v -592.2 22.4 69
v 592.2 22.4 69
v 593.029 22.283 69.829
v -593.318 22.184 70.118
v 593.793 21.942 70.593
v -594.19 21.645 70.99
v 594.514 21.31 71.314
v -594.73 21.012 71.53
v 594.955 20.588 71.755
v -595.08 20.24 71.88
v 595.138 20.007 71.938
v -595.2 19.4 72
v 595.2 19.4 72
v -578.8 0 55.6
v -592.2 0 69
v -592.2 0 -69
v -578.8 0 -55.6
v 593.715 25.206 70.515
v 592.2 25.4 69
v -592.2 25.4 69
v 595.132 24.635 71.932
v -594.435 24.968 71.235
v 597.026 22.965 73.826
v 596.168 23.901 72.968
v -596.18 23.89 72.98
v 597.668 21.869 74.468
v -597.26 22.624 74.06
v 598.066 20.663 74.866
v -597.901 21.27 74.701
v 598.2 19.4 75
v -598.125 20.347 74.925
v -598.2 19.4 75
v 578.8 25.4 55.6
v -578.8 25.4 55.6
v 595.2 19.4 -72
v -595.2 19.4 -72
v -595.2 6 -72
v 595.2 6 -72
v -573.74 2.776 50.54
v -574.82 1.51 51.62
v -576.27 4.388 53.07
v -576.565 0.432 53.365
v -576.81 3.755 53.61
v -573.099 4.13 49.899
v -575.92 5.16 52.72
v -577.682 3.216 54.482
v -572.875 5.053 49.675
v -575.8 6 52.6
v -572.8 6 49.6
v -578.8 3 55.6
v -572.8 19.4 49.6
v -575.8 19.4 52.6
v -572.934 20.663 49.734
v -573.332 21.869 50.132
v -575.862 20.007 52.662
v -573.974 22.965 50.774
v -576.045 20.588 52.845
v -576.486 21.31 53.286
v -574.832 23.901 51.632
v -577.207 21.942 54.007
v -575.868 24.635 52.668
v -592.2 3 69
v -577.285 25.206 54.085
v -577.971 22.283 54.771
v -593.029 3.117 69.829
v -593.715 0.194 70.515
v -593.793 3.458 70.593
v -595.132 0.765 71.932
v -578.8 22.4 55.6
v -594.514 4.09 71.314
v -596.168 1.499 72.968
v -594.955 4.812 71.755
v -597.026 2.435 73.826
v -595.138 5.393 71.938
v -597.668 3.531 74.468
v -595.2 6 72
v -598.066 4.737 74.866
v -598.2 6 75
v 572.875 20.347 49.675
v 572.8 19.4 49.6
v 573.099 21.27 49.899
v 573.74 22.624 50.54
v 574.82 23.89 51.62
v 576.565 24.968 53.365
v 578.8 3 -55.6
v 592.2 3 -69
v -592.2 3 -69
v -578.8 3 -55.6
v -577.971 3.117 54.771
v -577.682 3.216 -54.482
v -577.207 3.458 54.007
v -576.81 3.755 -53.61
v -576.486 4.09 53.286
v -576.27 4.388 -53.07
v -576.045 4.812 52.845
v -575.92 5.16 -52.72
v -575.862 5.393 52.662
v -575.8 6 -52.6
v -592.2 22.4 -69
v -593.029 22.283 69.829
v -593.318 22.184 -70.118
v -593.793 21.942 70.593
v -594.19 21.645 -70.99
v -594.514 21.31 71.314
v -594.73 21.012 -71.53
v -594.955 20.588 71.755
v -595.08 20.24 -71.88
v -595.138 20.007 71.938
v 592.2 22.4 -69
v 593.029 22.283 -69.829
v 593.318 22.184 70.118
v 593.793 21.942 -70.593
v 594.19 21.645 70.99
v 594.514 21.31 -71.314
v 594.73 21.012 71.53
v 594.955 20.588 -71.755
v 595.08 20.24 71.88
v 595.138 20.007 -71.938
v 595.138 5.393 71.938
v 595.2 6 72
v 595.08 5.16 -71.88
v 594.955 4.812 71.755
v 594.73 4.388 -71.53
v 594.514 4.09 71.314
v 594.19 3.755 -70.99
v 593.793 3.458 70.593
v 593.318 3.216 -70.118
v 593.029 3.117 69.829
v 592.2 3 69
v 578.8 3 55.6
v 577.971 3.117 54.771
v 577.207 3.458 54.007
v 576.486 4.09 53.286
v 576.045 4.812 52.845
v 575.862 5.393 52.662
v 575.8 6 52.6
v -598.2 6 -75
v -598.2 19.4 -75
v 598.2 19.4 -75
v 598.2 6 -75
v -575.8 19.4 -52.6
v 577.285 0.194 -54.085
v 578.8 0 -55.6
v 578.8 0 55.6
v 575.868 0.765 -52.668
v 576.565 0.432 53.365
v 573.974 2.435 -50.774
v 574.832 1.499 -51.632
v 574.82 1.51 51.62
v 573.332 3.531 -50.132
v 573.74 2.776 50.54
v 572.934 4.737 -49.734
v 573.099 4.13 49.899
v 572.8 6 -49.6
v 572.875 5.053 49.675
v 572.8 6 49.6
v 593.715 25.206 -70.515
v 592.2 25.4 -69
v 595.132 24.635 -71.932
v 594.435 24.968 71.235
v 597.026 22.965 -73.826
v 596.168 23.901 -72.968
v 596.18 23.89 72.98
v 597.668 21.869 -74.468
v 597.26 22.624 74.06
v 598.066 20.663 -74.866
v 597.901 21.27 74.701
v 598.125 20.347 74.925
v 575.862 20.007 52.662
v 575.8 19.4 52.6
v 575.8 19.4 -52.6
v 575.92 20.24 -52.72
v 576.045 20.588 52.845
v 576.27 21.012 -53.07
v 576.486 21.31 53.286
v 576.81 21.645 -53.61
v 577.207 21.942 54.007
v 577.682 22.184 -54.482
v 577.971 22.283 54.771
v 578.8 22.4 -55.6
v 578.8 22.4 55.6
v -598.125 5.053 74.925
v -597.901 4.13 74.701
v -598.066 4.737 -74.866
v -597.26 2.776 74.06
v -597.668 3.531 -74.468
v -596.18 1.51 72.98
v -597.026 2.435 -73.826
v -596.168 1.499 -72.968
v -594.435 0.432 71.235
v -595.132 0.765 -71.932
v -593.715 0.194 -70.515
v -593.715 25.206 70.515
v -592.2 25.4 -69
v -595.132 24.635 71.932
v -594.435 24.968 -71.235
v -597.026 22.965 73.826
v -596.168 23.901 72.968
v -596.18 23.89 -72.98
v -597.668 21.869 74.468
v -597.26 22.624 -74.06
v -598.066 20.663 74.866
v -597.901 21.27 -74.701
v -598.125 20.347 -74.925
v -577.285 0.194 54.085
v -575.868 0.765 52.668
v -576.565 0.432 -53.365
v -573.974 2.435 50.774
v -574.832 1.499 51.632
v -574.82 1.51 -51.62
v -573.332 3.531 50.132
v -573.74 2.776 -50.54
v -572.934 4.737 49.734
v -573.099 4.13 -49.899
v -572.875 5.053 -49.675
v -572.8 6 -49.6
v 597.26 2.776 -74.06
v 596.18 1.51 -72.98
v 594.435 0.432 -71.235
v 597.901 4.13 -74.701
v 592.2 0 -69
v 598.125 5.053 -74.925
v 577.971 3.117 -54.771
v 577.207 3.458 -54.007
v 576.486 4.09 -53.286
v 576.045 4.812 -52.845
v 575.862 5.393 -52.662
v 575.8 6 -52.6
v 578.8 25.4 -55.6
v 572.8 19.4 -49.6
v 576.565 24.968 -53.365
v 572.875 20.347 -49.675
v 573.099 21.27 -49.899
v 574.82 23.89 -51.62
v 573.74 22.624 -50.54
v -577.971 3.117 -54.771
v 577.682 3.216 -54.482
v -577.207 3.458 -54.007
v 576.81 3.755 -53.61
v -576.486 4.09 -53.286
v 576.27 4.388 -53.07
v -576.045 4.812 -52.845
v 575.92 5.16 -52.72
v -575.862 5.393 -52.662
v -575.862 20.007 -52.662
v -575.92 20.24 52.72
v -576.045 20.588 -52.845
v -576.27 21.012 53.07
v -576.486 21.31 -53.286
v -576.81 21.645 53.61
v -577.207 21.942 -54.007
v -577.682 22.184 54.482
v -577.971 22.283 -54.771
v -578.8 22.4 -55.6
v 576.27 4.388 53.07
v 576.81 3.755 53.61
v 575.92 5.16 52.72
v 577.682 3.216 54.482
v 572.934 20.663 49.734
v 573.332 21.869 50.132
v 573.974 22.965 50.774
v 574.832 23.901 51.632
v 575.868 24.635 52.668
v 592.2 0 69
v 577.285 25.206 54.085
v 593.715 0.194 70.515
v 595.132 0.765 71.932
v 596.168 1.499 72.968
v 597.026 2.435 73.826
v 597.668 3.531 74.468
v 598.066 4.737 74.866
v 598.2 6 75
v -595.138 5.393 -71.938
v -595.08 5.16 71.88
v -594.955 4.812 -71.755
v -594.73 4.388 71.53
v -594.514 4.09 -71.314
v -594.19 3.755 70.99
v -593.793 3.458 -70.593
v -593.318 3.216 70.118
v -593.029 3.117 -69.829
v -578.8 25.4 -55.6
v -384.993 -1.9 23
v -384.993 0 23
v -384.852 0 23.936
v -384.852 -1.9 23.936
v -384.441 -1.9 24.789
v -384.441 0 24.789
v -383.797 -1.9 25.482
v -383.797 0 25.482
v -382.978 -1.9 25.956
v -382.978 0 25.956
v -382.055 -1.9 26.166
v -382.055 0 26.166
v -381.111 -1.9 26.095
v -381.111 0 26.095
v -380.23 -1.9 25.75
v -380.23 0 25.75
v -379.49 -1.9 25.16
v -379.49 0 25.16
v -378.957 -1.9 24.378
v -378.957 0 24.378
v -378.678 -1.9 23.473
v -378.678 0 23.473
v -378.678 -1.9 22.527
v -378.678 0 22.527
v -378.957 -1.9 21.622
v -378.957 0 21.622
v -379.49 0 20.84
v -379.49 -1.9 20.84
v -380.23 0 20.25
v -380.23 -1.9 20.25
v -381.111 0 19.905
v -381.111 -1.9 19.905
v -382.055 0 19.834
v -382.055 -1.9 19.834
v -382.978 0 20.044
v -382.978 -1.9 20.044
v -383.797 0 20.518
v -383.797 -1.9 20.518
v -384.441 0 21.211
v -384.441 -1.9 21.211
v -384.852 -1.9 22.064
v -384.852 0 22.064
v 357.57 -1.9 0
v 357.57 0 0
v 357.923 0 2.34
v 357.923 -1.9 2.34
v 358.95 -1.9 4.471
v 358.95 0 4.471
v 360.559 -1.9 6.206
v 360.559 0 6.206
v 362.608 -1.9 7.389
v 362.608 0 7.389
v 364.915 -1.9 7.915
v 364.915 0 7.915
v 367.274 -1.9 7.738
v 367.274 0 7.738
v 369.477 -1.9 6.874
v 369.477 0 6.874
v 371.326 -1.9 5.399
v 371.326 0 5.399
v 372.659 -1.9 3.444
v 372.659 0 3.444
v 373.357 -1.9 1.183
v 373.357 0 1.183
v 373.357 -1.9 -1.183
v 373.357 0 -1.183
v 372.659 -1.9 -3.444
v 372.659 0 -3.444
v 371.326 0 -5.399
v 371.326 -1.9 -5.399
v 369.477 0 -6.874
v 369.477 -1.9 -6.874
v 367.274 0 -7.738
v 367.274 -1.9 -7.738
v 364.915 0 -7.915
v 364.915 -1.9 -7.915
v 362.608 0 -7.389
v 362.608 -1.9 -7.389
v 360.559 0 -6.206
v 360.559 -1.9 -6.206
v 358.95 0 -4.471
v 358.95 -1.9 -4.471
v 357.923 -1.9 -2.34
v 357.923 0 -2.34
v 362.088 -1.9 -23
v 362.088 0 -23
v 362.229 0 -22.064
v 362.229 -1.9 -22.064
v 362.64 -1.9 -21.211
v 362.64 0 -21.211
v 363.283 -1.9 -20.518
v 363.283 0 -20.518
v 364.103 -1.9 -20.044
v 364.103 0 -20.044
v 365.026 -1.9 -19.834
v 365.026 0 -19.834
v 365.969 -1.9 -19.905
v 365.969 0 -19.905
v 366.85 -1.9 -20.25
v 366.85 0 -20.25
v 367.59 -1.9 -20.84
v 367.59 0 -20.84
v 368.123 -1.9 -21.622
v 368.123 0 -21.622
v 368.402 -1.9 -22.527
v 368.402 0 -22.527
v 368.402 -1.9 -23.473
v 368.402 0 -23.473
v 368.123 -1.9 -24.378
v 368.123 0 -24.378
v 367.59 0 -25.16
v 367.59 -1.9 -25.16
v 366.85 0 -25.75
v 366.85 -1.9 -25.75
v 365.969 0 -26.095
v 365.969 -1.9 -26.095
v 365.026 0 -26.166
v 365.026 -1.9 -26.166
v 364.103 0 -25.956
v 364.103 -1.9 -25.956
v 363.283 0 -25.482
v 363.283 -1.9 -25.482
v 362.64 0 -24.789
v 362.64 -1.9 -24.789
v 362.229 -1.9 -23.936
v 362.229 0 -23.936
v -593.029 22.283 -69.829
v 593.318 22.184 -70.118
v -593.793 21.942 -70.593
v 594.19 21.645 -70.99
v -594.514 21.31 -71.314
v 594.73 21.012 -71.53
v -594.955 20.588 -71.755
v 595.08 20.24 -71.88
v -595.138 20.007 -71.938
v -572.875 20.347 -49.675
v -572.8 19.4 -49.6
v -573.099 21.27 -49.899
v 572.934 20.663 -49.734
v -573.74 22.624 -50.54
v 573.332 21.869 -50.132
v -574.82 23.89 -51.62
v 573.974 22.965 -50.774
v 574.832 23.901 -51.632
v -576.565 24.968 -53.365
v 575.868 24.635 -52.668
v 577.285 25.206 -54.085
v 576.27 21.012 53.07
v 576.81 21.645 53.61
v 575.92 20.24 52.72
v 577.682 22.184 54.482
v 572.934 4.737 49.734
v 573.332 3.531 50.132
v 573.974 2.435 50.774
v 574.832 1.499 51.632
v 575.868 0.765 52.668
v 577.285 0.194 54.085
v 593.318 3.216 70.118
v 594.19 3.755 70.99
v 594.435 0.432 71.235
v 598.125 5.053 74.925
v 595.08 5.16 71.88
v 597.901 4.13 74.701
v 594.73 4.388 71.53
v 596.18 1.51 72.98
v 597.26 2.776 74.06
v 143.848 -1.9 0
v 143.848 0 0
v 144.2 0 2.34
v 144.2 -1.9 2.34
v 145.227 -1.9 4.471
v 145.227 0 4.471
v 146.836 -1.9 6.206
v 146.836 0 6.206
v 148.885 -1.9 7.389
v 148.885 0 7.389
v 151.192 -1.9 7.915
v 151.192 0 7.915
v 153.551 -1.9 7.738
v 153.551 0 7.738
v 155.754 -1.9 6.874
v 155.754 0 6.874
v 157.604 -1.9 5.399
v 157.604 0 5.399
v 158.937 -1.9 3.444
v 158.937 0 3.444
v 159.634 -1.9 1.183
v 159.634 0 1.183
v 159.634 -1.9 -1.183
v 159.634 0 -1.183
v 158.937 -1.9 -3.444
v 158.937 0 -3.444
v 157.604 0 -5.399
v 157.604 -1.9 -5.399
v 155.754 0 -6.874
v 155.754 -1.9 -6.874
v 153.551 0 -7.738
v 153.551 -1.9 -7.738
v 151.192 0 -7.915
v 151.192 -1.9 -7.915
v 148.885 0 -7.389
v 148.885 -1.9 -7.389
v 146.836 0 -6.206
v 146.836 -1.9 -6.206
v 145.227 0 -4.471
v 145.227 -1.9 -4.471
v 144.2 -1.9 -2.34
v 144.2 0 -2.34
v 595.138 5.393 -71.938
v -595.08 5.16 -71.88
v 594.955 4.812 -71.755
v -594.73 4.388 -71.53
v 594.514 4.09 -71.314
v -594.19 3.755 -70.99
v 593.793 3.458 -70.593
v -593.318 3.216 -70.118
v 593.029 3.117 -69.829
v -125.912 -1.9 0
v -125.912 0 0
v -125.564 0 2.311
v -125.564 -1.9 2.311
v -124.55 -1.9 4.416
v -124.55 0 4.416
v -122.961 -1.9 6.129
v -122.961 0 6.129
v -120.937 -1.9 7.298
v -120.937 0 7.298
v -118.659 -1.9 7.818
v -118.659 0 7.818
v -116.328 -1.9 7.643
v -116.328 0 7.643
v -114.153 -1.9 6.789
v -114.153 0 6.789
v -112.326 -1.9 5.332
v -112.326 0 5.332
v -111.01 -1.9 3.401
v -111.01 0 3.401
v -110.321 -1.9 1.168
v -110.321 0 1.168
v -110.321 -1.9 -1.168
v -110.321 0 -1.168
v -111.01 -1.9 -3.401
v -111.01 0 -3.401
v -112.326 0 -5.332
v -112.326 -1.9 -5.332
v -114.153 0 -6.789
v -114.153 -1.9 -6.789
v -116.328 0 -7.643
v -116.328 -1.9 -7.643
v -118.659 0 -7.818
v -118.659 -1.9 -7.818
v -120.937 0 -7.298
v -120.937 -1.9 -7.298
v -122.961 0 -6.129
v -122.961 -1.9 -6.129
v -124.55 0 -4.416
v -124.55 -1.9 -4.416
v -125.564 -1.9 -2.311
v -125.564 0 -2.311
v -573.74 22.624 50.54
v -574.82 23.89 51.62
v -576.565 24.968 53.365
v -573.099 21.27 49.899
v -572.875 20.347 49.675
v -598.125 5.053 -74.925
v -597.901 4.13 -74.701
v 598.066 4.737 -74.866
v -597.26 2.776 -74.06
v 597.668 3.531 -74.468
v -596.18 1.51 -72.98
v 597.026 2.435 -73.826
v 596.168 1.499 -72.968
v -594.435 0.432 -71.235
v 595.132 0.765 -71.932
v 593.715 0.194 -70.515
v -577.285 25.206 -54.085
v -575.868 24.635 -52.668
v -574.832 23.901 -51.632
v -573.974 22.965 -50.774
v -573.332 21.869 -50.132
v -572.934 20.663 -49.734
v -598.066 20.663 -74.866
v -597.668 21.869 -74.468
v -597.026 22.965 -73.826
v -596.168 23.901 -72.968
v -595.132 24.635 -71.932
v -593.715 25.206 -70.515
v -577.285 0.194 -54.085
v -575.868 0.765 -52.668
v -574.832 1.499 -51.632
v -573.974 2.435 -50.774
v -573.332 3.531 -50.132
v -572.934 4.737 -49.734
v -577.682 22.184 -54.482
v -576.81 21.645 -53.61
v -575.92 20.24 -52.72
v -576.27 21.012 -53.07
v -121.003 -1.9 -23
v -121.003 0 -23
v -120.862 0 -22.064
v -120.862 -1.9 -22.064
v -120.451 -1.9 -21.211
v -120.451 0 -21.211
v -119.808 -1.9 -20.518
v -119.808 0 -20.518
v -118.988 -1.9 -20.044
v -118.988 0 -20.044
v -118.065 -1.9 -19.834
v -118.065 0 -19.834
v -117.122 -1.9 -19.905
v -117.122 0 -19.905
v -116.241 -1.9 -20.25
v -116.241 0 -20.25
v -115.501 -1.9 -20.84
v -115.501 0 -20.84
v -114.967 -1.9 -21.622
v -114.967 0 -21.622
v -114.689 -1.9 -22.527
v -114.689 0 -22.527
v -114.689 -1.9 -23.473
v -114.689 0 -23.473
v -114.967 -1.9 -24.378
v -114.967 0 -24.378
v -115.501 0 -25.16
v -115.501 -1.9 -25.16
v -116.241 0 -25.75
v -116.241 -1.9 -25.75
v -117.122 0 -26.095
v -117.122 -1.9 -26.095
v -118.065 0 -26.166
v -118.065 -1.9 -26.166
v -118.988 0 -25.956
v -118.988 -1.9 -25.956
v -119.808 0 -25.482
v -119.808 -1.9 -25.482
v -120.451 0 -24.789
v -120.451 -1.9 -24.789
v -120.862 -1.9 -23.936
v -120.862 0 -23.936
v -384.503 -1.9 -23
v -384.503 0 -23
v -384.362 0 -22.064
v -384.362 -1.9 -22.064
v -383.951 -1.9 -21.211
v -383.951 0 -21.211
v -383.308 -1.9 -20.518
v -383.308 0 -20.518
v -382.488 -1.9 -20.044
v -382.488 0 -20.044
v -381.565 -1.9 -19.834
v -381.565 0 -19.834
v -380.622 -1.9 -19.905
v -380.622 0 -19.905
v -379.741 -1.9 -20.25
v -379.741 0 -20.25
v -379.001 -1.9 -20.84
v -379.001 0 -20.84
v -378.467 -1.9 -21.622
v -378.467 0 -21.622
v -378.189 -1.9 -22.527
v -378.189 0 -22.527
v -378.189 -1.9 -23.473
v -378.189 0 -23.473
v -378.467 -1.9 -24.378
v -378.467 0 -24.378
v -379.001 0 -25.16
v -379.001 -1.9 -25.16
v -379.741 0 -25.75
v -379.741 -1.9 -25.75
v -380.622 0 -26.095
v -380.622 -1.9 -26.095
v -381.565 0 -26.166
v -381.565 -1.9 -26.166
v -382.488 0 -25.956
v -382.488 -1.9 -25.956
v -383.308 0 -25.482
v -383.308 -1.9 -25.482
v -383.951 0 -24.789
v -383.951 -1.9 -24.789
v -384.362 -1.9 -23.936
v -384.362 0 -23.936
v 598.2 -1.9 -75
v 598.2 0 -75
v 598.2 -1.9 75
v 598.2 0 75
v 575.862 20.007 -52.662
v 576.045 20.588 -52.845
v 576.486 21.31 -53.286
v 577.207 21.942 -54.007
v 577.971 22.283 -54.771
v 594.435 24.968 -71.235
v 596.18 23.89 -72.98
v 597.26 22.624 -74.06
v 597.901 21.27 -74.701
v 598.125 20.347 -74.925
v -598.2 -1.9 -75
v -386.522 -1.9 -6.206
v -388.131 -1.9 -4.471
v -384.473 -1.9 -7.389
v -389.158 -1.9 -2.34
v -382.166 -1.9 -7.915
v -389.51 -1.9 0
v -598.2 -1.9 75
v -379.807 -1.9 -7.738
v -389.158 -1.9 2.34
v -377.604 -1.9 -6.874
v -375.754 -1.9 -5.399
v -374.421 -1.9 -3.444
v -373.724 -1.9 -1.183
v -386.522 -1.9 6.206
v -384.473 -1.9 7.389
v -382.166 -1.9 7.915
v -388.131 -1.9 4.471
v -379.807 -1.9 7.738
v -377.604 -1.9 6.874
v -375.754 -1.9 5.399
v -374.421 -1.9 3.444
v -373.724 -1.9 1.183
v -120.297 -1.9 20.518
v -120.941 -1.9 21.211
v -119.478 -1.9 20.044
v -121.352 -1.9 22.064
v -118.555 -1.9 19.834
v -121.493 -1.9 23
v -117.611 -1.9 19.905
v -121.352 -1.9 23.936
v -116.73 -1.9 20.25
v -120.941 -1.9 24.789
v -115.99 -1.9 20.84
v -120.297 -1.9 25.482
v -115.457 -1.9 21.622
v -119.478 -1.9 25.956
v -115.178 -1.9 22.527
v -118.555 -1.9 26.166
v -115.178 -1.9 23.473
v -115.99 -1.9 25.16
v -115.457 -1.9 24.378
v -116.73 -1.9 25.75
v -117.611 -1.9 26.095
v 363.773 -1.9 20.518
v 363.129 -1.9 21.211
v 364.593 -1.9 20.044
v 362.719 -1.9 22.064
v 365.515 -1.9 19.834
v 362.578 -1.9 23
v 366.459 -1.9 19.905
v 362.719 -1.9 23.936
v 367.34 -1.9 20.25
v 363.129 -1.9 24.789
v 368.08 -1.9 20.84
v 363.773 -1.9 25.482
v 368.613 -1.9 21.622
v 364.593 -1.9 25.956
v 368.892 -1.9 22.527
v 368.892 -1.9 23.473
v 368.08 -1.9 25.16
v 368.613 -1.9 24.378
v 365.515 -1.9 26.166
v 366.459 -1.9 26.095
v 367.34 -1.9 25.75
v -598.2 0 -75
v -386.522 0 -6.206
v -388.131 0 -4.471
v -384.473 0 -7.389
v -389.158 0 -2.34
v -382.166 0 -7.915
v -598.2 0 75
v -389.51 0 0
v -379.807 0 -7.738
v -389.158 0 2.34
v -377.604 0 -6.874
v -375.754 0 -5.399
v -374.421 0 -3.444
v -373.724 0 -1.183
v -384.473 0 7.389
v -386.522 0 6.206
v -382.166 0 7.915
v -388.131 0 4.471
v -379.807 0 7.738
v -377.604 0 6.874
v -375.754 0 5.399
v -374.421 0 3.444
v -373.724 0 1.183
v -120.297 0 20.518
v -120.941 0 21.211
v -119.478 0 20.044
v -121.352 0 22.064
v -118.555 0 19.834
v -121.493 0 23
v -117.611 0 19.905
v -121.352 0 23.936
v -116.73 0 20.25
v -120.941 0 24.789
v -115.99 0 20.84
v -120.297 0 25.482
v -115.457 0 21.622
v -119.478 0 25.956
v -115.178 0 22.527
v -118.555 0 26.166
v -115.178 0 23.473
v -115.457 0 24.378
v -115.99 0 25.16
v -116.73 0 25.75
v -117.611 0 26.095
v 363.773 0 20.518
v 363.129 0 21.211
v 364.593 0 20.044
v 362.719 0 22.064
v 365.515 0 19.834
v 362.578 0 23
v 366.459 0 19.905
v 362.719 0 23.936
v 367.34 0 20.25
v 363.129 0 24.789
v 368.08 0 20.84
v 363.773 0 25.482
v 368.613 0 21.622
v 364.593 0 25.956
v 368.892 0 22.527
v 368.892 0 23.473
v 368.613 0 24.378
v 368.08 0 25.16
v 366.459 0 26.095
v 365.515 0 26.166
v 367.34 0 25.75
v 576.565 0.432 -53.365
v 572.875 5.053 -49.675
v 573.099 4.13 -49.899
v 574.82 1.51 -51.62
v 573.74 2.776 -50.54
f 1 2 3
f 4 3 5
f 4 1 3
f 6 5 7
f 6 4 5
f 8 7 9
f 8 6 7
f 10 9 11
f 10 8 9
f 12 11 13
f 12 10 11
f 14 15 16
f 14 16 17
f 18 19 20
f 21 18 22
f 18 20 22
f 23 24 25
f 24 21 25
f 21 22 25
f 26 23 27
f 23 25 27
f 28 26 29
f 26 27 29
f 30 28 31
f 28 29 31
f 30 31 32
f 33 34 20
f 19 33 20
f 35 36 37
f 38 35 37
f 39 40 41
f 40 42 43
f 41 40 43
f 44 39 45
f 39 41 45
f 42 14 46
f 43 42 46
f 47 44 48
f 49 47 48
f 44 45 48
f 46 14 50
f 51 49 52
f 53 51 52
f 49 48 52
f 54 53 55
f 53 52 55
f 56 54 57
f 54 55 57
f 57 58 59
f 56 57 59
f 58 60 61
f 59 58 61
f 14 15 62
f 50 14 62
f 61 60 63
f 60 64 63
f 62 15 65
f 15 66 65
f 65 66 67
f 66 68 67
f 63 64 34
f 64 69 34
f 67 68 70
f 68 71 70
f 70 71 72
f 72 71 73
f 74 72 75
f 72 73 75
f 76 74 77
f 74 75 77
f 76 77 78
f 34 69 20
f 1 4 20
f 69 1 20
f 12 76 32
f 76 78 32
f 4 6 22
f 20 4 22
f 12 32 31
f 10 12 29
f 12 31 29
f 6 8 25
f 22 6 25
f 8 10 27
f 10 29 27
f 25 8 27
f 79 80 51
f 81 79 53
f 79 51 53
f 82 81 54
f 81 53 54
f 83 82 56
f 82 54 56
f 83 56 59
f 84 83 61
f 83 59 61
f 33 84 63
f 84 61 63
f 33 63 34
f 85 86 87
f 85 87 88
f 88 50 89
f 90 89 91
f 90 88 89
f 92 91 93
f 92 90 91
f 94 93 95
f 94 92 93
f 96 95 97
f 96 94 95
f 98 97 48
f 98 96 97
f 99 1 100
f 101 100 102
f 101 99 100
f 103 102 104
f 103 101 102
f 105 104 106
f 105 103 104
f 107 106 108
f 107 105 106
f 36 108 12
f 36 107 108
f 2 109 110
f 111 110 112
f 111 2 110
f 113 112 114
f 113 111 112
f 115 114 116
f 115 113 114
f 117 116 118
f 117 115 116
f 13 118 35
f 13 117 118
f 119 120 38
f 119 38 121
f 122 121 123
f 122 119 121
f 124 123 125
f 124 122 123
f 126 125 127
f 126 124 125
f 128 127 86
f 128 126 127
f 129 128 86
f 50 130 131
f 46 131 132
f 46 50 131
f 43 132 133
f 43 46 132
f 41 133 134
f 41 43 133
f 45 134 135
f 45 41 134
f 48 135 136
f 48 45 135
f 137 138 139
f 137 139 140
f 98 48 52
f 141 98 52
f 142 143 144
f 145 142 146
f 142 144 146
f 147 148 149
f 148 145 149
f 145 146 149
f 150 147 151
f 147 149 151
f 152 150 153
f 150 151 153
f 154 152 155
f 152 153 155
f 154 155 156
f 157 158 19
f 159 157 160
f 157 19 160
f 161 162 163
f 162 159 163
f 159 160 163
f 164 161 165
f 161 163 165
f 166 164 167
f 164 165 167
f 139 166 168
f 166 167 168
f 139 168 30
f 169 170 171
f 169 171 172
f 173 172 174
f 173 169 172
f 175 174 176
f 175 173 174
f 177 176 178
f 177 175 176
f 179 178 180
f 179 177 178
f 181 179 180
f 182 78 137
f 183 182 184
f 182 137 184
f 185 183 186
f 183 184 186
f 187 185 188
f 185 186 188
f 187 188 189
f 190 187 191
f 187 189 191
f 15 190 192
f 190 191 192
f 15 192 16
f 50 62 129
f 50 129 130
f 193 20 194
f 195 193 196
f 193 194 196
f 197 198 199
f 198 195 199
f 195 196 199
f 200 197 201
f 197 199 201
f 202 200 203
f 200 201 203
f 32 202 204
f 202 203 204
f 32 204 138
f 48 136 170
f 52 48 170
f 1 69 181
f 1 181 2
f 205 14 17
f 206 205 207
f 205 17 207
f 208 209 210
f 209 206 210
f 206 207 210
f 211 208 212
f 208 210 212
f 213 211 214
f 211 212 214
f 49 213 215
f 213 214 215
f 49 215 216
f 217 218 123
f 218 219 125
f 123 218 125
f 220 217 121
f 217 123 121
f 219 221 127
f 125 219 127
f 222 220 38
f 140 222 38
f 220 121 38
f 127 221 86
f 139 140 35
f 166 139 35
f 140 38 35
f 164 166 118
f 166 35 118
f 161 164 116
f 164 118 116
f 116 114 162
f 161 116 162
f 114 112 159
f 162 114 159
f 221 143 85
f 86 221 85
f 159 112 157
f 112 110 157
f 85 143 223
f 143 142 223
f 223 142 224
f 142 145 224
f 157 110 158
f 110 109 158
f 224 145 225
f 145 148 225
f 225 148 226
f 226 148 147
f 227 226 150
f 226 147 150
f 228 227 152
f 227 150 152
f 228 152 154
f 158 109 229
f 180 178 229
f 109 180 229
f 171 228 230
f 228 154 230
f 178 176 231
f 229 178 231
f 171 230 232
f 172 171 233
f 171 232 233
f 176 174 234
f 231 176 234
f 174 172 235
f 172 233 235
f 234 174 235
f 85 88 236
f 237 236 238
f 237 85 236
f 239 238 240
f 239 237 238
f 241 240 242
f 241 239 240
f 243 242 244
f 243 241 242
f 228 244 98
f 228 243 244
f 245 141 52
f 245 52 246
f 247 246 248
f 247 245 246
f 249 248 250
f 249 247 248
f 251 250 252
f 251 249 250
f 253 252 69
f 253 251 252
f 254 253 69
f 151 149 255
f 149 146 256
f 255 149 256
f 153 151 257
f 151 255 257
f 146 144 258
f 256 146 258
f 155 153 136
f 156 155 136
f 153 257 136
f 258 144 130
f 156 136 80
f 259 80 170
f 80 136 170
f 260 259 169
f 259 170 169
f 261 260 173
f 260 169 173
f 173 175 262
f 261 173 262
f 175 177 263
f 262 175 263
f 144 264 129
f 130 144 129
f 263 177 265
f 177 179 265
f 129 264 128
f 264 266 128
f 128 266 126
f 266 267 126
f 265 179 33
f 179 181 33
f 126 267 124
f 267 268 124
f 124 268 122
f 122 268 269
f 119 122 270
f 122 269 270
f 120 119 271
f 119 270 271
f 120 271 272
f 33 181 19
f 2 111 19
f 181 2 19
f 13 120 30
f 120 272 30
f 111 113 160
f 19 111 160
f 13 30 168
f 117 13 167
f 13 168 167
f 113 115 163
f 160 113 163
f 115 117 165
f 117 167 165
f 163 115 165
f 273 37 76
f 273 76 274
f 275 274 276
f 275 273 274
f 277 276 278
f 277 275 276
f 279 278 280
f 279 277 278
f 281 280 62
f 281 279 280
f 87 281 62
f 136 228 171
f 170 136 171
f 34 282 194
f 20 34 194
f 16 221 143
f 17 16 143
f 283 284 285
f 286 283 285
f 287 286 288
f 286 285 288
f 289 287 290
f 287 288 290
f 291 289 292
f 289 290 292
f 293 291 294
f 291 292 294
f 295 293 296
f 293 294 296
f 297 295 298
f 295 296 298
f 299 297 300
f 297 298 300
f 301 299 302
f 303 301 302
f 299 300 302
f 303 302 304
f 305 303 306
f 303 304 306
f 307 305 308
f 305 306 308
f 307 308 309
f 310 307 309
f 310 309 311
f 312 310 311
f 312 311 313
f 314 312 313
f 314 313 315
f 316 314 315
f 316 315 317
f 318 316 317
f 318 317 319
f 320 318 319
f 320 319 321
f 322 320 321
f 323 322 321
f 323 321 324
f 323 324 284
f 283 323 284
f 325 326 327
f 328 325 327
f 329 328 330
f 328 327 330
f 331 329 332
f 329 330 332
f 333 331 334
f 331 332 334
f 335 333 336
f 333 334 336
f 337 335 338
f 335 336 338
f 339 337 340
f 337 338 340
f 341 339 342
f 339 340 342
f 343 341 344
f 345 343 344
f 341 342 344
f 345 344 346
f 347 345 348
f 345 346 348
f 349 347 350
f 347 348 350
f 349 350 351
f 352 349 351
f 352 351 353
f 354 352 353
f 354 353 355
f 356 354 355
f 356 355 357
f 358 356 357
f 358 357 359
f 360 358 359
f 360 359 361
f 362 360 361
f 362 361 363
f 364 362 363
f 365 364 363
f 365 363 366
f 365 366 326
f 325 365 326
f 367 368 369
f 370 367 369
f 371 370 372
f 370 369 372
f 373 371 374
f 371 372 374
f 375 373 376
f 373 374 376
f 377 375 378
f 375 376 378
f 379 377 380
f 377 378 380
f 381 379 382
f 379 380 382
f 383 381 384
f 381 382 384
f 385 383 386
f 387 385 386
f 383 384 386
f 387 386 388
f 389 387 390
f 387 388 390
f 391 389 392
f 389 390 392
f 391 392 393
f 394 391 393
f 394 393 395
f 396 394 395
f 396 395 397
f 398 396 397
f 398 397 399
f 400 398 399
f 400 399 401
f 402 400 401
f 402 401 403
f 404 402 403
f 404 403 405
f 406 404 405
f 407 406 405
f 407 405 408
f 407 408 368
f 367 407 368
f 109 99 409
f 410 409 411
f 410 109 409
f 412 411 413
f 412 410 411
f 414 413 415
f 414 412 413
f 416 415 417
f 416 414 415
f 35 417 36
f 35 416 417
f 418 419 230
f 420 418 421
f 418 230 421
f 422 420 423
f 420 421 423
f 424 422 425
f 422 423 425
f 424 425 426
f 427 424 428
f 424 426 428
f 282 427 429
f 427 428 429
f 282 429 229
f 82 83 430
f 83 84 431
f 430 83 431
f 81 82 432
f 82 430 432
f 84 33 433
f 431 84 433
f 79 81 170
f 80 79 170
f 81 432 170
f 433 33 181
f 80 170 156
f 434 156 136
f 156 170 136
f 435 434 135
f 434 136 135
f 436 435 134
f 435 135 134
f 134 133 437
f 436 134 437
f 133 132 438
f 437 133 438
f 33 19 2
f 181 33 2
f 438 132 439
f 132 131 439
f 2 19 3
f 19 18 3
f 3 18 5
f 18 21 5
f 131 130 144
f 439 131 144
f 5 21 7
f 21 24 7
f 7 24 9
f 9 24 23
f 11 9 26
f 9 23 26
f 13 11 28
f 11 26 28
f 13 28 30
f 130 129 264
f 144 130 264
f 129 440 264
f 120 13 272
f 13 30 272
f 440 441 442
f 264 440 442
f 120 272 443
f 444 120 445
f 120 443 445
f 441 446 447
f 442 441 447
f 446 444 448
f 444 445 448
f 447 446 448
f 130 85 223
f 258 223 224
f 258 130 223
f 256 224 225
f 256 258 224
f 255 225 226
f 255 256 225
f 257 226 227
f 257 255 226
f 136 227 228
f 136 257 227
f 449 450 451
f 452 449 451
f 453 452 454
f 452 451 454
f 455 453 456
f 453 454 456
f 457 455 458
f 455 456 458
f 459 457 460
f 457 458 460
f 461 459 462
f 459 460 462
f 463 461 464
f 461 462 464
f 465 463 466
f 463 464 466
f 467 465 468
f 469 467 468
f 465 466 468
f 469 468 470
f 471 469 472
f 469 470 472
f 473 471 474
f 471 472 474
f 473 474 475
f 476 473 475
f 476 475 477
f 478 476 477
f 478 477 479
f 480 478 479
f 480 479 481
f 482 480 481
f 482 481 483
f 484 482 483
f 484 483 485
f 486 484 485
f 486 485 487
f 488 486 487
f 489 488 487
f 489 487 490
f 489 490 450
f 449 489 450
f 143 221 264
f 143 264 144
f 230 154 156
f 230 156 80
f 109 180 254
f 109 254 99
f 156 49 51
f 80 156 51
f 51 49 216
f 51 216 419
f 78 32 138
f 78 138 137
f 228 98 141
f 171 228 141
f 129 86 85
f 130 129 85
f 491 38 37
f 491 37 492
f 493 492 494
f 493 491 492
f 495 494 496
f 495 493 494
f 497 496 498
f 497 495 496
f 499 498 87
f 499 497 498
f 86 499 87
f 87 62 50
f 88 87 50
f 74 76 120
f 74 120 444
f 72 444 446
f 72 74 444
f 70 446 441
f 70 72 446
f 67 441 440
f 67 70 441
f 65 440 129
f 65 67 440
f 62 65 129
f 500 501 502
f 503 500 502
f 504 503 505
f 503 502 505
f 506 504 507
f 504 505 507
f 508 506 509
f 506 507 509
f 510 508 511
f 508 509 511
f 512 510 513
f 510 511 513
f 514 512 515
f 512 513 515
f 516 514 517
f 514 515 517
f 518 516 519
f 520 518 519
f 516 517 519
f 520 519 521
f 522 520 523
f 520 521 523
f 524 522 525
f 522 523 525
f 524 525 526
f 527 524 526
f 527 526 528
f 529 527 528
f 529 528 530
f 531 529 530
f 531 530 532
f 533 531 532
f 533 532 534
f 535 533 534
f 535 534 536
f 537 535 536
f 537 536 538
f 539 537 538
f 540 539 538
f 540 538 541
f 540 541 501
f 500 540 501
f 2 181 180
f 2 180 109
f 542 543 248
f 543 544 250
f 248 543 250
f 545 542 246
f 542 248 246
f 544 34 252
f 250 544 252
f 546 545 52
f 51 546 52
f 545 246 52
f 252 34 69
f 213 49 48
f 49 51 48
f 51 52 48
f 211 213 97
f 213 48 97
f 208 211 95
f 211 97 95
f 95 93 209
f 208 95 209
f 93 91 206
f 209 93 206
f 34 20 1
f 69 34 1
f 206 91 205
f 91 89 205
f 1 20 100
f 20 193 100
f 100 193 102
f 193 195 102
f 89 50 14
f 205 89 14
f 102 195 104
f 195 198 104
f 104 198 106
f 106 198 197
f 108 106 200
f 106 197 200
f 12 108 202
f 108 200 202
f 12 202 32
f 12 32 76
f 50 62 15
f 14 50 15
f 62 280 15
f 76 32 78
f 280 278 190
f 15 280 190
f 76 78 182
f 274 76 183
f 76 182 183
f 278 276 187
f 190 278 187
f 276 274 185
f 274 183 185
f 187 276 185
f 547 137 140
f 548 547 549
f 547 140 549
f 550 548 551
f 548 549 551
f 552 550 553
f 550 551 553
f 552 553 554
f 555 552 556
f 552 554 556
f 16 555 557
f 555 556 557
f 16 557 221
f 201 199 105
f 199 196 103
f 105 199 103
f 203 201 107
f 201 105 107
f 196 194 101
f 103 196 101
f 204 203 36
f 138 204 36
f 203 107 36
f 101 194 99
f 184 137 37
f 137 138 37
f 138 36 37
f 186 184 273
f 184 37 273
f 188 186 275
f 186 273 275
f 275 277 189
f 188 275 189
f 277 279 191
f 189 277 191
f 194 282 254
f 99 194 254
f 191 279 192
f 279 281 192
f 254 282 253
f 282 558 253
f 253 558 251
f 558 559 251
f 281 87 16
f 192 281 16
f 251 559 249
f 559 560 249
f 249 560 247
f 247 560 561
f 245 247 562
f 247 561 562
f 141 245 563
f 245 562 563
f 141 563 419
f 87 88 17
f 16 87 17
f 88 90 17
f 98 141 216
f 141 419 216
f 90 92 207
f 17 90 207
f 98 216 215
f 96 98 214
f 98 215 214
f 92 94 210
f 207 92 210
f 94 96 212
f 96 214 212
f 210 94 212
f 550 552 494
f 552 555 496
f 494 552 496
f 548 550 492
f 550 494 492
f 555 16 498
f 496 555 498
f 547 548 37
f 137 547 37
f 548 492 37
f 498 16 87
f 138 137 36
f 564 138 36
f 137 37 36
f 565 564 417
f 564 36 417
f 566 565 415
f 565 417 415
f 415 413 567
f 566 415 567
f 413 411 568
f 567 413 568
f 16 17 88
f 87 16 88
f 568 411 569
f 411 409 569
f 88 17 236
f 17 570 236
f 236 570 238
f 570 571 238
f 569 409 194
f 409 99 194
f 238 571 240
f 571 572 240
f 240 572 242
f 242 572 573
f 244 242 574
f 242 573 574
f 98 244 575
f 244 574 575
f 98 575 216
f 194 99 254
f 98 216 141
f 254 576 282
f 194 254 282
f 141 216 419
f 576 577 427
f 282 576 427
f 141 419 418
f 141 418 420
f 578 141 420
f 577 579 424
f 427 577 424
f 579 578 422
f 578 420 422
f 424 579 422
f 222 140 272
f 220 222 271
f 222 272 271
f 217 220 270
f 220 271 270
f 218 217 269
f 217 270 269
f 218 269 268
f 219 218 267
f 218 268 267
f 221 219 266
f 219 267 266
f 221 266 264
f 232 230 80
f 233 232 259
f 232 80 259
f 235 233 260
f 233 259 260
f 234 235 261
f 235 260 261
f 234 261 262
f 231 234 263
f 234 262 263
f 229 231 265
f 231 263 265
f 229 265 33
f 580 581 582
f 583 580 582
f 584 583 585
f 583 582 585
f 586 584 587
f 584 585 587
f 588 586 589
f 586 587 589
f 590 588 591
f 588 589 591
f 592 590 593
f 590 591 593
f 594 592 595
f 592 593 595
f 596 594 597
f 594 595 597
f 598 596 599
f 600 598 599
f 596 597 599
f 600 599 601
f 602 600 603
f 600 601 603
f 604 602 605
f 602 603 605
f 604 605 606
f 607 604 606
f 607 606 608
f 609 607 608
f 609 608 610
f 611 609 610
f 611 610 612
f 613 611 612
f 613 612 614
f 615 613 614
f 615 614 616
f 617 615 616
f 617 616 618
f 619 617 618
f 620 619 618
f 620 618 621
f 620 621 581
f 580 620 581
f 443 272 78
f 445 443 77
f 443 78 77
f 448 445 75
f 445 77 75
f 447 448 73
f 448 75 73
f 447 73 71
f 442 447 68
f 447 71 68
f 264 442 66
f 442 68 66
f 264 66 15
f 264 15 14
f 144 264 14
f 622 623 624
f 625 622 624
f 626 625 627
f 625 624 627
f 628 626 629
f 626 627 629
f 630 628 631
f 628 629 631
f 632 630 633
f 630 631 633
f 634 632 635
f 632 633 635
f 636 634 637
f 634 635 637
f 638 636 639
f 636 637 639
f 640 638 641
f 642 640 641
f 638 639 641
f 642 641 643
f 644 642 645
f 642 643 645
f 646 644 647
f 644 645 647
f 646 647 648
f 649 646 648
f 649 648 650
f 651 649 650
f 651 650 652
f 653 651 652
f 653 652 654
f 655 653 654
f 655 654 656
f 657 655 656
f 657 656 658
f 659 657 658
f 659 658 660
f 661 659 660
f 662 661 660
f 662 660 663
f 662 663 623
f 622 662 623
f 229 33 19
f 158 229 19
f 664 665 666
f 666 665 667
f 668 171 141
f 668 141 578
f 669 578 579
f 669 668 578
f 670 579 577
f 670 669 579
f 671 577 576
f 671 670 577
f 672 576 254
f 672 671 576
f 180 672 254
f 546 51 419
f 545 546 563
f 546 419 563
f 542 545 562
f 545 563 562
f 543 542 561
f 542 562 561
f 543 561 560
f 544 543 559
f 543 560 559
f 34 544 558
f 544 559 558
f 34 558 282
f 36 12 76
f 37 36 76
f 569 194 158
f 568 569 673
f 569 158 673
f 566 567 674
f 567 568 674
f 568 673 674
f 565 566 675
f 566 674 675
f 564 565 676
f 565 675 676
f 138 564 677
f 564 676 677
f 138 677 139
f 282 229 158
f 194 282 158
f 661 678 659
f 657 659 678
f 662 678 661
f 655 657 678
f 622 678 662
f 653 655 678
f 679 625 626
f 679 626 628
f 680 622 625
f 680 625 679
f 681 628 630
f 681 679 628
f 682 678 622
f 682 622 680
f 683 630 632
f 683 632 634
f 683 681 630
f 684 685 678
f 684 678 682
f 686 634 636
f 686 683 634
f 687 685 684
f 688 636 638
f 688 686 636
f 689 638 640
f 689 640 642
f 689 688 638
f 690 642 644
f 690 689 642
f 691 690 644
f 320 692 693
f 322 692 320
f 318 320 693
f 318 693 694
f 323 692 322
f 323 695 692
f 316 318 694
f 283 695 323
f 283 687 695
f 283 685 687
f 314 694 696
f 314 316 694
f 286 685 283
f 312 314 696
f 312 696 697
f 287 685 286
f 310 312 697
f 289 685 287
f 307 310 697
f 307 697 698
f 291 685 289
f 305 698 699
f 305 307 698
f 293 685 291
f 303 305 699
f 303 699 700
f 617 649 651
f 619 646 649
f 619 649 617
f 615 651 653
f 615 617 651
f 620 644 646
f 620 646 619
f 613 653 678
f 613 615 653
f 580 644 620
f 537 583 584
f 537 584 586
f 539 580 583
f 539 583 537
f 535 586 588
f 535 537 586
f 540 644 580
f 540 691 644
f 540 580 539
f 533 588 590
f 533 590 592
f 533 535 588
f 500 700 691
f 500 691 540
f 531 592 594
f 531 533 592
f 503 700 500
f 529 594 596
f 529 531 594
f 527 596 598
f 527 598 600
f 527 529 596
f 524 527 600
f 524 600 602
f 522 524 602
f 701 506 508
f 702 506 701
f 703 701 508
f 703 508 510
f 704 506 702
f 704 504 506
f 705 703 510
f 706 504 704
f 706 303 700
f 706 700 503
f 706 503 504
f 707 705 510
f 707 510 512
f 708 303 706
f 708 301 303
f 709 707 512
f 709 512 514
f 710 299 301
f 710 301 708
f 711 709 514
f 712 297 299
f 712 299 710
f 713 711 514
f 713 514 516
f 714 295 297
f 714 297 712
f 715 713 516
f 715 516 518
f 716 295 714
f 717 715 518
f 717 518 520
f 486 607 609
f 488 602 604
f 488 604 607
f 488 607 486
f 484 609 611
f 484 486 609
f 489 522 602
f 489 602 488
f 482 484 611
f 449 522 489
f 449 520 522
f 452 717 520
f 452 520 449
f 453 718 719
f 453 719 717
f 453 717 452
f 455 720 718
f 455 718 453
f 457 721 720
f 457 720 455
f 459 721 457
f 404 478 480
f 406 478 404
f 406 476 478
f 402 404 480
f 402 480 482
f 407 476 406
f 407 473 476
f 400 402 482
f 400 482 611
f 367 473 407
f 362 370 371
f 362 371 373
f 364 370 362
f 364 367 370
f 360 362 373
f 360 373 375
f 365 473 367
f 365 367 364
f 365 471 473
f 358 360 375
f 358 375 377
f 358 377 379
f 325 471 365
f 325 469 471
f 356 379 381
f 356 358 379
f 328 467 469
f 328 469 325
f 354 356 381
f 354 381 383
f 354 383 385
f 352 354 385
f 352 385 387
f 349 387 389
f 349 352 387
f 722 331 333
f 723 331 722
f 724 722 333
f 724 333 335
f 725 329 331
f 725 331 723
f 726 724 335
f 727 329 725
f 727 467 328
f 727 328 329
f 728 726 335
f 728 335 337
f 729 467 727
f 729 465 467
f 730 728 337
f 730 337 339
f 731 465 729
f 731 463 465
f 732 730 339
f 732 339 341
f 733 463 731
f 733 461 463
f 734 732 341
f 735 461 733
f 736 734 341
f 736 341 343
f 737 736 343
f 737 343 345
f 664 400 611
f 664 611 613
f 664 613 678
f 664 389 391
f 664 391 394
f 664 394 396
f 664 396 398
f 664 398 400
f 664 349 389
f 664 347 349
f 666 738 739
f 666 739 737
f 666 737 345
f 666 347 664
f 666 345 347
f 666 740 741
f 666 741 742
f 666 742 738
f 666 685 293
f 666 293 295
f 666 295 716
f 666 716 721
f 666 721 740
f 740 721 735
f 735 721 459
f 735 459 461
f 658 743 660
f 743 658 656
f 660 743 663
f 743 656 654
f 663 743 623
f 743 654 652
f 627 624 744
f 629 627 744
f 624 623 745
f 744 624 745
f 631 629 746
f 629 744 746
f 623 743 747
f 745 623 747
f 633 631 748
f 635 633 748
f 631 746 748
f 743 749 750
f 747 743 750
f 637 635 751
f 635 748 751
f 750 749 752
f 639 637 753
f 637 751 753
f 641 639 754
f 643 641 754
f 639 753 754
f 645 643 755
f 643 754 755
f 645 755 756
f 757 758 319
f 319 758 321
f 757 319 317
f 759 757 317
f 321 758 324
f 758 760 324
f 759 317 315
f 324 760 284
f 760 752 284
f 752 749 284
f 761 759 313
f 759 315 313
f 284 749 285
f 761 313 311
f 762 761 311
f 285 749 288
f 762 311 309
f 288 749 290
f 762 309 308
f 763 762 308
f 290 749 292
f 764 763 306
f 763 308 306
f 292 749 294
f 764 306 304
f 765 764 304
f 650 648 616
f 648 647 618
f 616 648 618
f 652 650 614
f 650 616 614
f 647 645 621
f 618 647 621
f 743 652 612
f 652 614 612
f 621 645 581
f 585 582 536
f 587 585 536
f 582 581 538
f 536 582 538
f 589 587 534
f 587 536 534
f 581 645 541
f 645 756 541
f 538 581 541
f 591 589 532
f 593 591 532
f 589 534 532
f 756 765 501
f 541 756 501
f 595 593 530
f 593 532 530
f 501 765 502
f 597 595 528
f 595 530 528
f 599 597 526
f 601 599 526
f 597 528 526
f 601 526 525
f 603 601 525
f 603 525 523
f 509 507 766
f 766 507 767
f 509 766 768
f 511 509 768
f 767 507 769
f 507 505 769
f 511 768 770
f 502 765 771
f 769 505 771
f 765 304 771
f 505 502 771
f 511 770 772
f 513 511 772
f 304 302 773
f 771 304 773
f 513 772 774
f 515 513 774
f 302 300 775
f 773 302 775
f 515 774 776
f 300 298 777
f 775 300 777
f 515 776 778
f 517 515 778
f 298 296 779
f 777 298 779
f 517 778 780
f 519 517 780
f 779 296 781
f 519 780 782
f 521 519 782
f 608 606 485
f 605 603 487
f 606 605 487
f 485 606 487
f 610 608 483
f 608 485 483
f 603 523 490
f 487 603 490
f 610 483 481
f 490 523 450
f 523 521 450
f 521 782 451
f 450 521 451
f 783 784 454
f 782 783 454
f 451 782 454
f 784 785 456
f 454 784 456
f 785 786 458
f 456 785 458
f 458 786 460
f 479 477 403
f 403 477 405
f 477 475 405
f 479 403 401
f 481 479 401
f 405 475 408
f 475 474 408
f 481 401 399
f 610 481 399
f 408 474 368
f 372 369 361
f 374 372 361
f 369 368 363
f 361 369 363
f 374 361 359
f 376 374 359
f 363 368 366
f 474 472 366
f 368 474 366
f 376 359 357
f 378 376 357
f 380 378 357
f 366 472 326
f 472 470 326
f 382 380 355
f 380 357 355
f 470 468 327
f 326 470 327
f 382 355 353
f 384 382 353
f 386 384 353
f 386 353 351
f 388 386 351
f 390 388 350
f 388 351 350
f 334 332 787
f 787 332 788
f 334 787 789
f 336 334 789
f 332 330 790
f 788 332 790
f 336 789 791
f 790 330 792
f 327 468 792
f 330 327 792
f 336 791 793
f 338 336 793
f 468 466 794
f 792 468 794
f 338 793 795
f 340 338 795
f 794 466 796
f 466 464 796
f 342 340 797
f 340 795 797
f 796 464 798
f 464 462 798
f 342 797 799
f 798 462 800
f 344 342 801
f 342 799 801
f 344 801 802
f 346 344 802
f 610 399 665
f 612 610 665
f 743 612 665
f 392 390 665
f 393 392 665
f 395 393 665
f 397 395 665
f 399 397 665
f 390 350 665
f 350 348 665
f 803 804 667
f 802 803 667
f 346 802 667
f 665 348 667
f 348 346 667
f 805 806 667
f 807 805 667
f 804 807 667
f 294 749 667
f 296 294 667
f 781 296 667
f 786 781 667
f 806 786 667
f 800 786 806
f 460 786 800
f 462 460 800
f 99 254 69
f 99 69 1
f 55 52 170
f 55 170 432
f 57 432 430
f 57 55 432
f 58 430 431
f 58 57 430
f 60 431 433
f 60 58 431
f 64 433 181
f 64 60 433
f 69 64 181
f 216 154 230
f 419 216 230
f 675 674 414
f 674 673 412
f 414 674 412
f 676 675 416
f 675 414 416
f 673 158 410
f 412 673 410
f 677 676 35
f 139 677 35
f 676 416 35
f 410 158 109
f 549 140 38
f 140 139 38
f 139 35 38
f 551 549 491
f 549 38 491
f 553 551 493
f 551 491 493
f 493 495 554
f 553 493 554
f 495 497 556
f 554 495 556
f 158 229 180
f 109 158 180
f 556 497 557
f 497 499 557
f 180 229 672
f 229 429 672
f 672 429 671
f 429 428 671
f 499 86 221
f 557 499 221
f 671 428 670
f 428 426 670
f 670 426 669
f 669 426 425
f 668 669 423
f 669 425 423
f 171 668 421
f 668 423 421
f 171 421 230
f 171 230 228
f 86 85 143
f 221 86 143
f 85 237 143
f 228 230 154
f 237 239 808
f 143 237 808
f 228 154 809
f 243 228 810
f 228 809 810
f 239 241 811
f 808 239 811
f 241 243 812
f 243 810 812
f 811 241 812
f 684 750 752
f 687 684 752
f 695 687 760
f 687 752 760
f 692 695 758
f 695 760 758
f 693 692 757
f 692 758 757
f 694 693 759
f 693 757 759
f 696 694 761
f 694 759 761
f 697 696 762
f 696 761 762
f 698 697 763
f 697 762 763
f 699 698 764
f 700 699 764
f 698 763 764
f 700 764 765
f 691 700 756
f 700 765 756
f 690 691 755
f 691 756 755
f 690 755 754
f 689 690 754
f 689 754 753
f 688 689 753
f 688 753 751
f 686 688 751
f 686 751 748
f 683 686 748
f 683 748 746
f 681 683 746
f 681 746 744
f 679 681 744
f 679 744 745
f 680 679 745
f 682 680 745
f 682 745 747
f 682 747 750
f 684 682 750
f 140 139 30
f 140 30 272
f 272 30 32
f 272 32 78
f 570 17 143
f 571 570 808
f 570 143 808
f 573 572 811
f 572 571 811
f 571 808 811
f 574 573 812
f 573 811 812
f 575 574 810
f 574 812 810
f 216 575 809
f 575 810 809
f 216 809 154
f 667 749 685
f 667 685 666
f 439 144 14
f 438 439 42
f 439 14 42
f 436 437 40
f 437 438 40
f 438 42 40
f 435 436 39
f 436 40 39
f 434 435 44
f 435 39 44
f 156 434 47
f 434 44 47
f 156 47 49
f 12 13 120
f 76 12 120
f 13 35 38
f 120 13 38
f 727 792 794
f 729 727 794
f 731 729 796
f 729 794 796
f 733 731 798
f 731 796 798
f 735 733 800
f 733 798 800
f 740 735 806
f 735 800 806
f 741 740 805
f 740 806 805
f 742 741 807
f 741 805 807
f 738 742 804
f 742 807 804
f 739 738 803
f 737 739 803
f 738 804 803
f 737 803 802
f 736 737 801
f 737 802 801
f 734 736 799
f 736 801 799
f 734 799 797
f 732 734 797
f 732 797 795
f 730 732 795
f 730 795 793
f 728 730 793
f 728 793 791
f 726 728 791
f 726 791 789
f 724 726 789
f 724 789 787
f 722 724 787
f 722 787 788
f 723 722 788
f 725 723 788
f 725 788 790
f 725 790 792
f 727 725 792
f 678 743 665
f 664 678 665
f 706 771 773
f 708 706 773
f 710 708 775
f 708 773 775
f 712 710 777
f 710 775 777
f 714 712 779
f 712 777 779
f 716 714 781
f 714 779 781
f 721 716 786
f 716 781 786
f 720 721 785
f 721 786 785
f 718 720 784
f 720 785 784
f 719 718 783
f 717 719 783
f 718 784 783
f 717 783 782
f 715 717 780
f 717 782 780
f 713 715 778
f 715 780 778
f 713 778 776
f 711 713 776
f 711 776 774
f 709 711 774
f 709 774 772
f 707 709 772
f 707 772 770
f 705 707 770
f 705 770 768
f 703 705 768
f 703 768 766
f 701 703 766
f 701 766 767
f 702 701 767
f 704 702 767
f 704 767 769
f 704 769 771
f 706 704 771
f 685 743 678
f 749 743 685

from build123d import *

# Parameters (mm, degrees)
TUBO_CUADRADO_2_X_2_X_0_25_1_DEPTH      = 186.921024484
TUBO_CUADRADO_2_X_2_X_0_25_1_DEPTH_BACK = 36.921024484
TUBO_CUADRADO_2_X_2_X_0_25_1_2_DEPTH    = 1270.242048969
TUBO_CUADRADO_2_X_2_X_0_25_1_3_DEPTH    = 223.842048969
TUBO_CUADRADO_2_X_2_X_0_25_1_4_DEPTH    = 1270.242048969
CROQUIS3_W                              = 1196.4
CROQUIS3_H                              = 150
SALIENTE_EXTRUIR1_DEPTH                 = 1.9
CROQUIS4_R                              = 3.175
CROQUIS4_R_2                            = 7.9375
CROQUIS4_R_3                            = 7.839550791
CORTAR_EXTRUIR1_DEPTH                   = 63.5


with BuildPart() as part:
    # Sketch1 → Tubo cuadrado 2 X 2 X 0.25(1) (new, two sides: drawn at the far end of the back side and taken through both)
    with BuildSketch(Plane(origin=(-585.5, 12.7, -75), x_dir=(1, 0, 0), z_dir=(0, 0, 1)).offset(-TUBO_CUADRADO_2_X_2_X_0_25_1_DEPTH_BACK)):
        with BuildLine():
            Line((-6.7, -12.7), (6.7, -12.7))
            ThreePointArc((6.7, -12.7), (10.942640687, -10.942640687), (12.7, -6.7))
            Line((12.7, -6.7), (12.7, 6.7))
            ThreePointArc((12.7, 6.7), (10.942640687, 10.942640687), (6.7, 12.7))
            Line((6.7, 12.7), (-6.7, 12.7))
            ThreePointArc((-6.7, 12.7), (-10.942640687, 10.942640687), (-12.7, 6.7))
            Line((-12.7, 6.7), (-12.7, -6.7))
            ThreePointArc((-12.7, -6.7), (-10.942640687, -10.942640687), (-6.7, -12.7))
        make_face()
        with BuildLine():
            Line((-6.7, -9.7), (6.7, -9.7))
            ThreePointArc((6.7, -9.7), (8.821320344, -8.821320344), (9.7, -6.7))
            Line((9.7, -6.7), (9.7, 6.7))
            ThreePointArc((9.7, 6.7), (8.821320344, 8.821320344), (6.7, 9.7))
            Line((6.7, 9.7), (-6.7, 9.7))
            ThreePointArc((-6.7, 9.7), (-8.821320344, 8.821320344), (-9.7, 6.7))
            Line((-9.7, 6.7), (-9.7, -6.7))
            ThreePointArc((-9.7, -6.7), (-8.821320344, -8.821320344), (-6.7, -9.7))
        make_face(mode=Mode.SUBTRACT)
    extrude(amount=TUBO_CUADRADO_2_X_2_X_0_25_1_DEPTH + TUBO_CUADRADO_2_X_2_X_0_25_1_DEPTH_BACK)

    # Tubo cuadrado 2 X 2 X 0.25(1) mitre 1
    split(bisect_by=Plane(origin=(-598.2, 0, -75), x_dir=(0, -1, 0), z_dir=(-0.707106781, 0, 0.707106781)), keep=Keep.TOP)

    # Tubo cuadrado 2 X 2 X 0.25(1) mitre 2
    split(bisect_by=Plane(origin=(-598.2, 0, 75), x_dir=(0, -1, 0), z_dir=(-0.707106781, 0, -0.707106781)), keep=Keep.TOP)


with BuildPart() as body_2:
    # Sketch1 on segment 2 (carried to segment 2) → Tubo cuadrado 2 X 2 X 0.25_1 2 (new body)
    with BuildSketch(Plane(origin=(-635.121024484, 12.7, 62.3), x_dir=(0, 0, -1), z_dir=(1, 0, 0))):
        with BuildLine():
            Line((-6.7, -12.7), (6.7, -12.7))
            ThreePointArc((6.7, -12.7), (10.942640687, -10.942640687), (12.7, -6.7))
            Line((12.7, -6.7), (12.7, 6.7))
            ThreePointArc((12.7, 6.7), (10.942640687, 10.942640687), (6.7, 12.7))
            Line((6.7, 12.7), (-6.7, 12.7))
            ThreePointArc((-6.7, 12.7), (-10.942640687, 10.942640687), (-12.7, 6.7))
            Line((-12.7, 6.7), (-12.7, -6.7))
            ThreePointArc((-12.7, -6.7), (-10.942640687, -10.942640687), (-6.7, -12.7))
        make_face()
        with BuildLine():
            Line((-6.7, -9.7), (6.7, -9.7))
            ThreePointArc((6.7, -9.7), (8.821320344, -8.821320344), (9.7, -6.7))
            Line((9.7, -6.7), (9.7, 6.7))
            ThreePointArc((9.7, 6.7), (8.821320344, 8.821320344), (6.7, 9.7))
            Line((6.7, 9.7), (-6.7, 9.7))
            ThreePointArc((-6.7, 9.7), (-8.821320344, 8.821320344), (-9.7, 6.7))
            Line((-9.7, 6.7), (-9.7, -6.7))
            ThreePointArc((-9.7, -6.7), (-8.821320344, -8.821320344), (-6.7, -9.7))
        make_face(mode=Mode.SUBTRACT)
    extrude(amount=TUBO_CUADRADO_2_X_2_X_0_25_1_2_DEPTH)

    # Tubo cuadrado 2 X 2 X 0.25_1 2 mitre 1
    split(bisect_by=Plane(origin=(-598.2, 0, 75), x_dir=(0, 1, 0), z_dir=(0.707106781, 0, 0.707106781)), keep=Keep.TOP)

    # Tubo cuadrado 2 X 2 X 0.25_1 2 mitre 2
    split(bisect_by=Plane(origin=(598.2, 0, 75), x_dir=(0, -1, 0), z_dir=(-0.707106781, 0, 0.707106781)), keep=Keep.TOP)


with BuildPart() as body_3:
    # Sketch1 on segment 3 (carried to segment 3) → Tubo cuadrado 2 X 2 X 0.25_1 3 (new body)
    with BuildSketch(Plane(origin=(585.5, 12.7, 111.921024484), x_dir=(-1, 0, 0), z_dir=(0, 0, -1))):
        with BuildLine():
            Line((-6.7, -12.7), (6.7, -12.7))
            ThreePointArc((6.7, -12.7), (10.942640687, -10.942640687), (12.7, -6.7))
            Line((12.7, -6.7), (12.7, 6.7))
            ThreePointArc((12.7, 6.7), (10.942640687, 10.942640687), (6.7, 12.7))
            Line((6.7, 12.7), (-6.7, 12.7))
            ThreePointArc((-6.7, 12.7), (-10.942640687, 10.942640687), (-12.7, 6.7))
            Line((-12.7, 6.7), (-12.7, -6.7))
            ThreePointArc((-12.7, -6.7), (-10.942640687, -10.942640687), (-6.7, -12.7))
        make_face()
        with BuildLine():
            Line((-6.7, -9.7), (6.7, -9.7))
            ThreePointArc((6.7, -9.7), (8.821320344, -8.821320344), (9.7, -6.7))
            Line((9.7, -6.7), (9.7, 6.7))
            ThreePointArc((9.7, 6.7), (8.821320344, 8.821320344), (6.7, 9.7))
            Line((6.7, 9.7), (-6.7, 9.7))
            ThreePointArc((-6.7, 9.7), (-8.821320344, 8.821320344), (-9.7, 6.7))
            Line((-9.7, 6.7), (-9.7, -6.7))
            ThreePointArc((-9.7, -6.7), (-8.821320344, -8.821320344), (-6.7, -9.7))
        make_face(mode=Mode.SUBTRACT)
    extrude(amount=TUBO_CUADRADO_2_X_2_X_0_25_1_3_DEPTH)

    # Tubo cuadrado 2 X 2 X 0.25_1 3 mitre 1
    split(bisect_by=Plane(origin=(598.2, 0, -75), x_dir=(0, 1, 0), z_dir=(0.707106781, 0, 0.707106781)), keep=Keep.TOP)

    # Tubo cuadrado 2 X 2 X 0.25_1 3 mitre 2
    split(bisect_by=Plane(origin=(598.2, 0, 75), x_dir=(0, 1, 0), z_dir=(0.707106781, 0, -0.707106781)), keep=Keep.TOP)


with BuildPart() as body_4:
    # Sketch1 on segment 4 (carried to segment 4) → Tubo cuadrado 2 X 2 X 0.25_1 4 (new body)
    with BuildSketch(Plane(origin=(635.121024484, 12.7, -62.3), x_dir=(0, 0, 1), z_dir=(-1, 0, 0))):
        with BuildLine():
            Line((-6.7, -12.7), (6.7, -12.7))
            ThreePointArc((6.7, -12.7), (10.942640687, -10.942640687), (12.7, -6.7))
            Line((12.7, -6.7), (12.7, 6.7))
            ThreePointArc((12.7, 6.7), (10.942640687, 10.942640687), (6.7, 12.7))
            Line((6.7, 12.7), (-6.7, 12.7))
            ThreePointArc((-6.7, 12.7), (-10.942640687, 10.942640687), (-12.7, 6.7))
            Line((-12.7, 6.7), (-12.7, -6.7))
            ThreePointArc((-12.7, -6.7), (-10.942640687, -10.942640687), (-6.7, -12.7))
        make_face()
        with BuildLine():
            Line((-6.7, -9.7), (6.7, -9.7))
            ThreePointArc((6.7, -9.7), (8.821320344, -8.821320344), (9.7, -6.7))
            Line((9.7, -6.7), (9.7, 6.7))
            ThreePointArc((9.7, 6.7), (8.821320344, 8.821320344), (6.7, 9.7))
            Line((6.7, 9.7), (-6.7, 9.7))
            ThreePointArc((-6.7, 9.7), (-8.821320344, 8.821320344), (-9.7, 6.7))
            Line((-9.7, 6.7), (-9.7, -6.7))
            ThreePointArc((-9.7, -6.7), (-8.821320344, -8.821320344), (-6.7, -9.7))
        make_face(mode=Mode.SUBTRACT)
    extrude(amount=TUBO_CUADRADO_2_X_2_X_0_25_1_4_DEPTH)

    # Tubo cuadrado 2 X 2 X 0.25_1 4 mitre 1
    split(bisect_by=Plane(origin=(-598.2, 0, -75), x_dir=(0, 1, 0), z_dir=(0.707106781, 0, -0.707106781)), keep=Keep.TOP)

    # Tubo cuadrado 2 X 2 X 0.25_1 4 mitre 2
    split(bisect_by=Plane(origin=(598.2, 0, -75), x_dir=(0, -1, 0), z_dir=(-0.707106781, 0, -0.707106781)), keep=Keep.TOP)


with BuildPart() as body_5:
    # Croquis3 → Saliente-Extruir1 (new body)
    with BuildSketch(Plane.XZ):
        Rectangle(CROQUIS3_W, CROQUIS3_H)
    extrude(amount=SALIENTE_EXTRUIR1_DEPTH)

    # Croquis4 → Cortar-Extruir1 (cut)
    with BuildSketch(Plane(origin=(0, 0, 0), x_dir=(1, 0, 0), z_dir=(0, 1, 0))):
        with Locations(Location((-381.328059978, 23, 0), (0, 0, 180))):
            Circle(CROQUIS4_R)
        with Locations(Location((-381.572933, 0, 0), (0, 0, 180))):
            Circle(CROQUIS4_R_2)
        with Locations(Location((-381.817806022, -23, 0), (0, 0, 180))):
            Circle(CROQUIS4_R)
        with Locations(Location((-118.072933, 0, 0), (0, 0, 180))):
            Circle(CROQUIS4_R_3)
        with Locations(Location((-117.828059978, 23, 0), (0, 0, 180))):
            Circle(CROQUIS4_R)
        with Locations(Location((-118.317806022, -23, 0), (0, 0, 180))):
            Circle(CROQUIS4_R)
        with Locations(Location((151.785097887, 0, 0), (0, 0, 180))):
            Circle(CROQUIS4_R_2)
        with Locations(Location((365.507795334, 0, 0), (0, 0, 180))):
            Circle(CROQUIS4_R_2)
        with Locations(Location((365.262922313, 23, 0), (0, 0, 180))):
            Circle(CROQUIS4_R)
        with Locations(Location((365.752668356, -23, 0), (0, 0, 180))):
            Circle(CROQUIS4_R)
    extrude(amount=-CORTAR_EXTRUIR1_DEPTH, mode=Mode.SUBTRACT)


solid = Compound([part.part, body_2.part, body_3.part, body_4.part, body_5.part])
